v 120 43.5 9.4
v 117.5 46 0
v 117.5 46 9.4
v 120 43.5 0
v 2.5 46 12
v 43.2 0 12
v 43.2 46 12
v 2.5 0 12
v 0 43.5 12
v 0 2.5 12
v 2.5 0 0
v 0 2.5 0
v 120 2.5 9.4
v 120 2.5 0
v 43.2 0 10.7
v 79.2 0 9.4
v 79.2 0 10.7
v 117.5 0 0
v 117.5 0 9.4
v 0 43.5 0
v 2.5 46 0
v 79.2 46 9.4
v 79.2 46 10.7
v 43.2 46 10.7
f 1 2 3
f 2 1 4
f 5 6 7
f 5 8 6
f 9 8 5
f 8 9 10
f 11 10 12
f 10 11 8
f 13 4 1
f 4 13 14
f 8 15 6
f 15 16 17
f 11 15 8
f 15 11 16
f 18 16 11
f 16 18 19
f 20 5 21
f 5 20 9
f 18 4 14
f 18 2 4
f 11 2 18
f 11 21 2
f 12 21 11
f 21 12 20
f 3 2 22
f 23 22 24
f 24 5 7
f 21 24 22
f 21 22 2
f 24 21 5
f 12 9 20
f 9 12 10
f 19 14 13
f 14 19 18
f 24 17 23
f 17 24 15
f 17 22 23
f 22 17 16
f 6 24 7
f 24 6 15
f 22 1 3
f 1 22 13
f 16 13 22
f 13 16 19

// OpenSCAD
$fn = 32;

// ----------------------------------------------------------------------
// Stepped bar: twostep, 120 x 46 x 12/9.4 mm
// ----------------------------------------------------------------------

// --- parameters (mm) ---
bar_l = 120;              // bar length, X
bar_w = 46;               // bar width, Y
plate_t = 12;             // thickness of the thick zone, Z
thin_t = 9.4;             // thickness of the thin zone
corner_c = 2.5;           // corner chamfer of the bar
step_cut = 2.6;           // material removed from the thin zone
stair1_x = 43.2;          // position of the first stair
stair2_x = 79.2;          // position of the second stair
mid_t = 10.7;             // thickness of the middle zone
depth_1 = 1.3;            // depth of cut 1 from the top face
depth_2 = 2.6;            // depth of cut 2 from the top face

profile = [[2.5, 0], [117.5, 0], [120, 2.5], [120, 43.5], [117.5, 46], [2.5, 46], [0, 43.5], [0, 2.5]];  // primary outline, 8 points, counter clockwise
void_1 = [[43.2, -1], [79.2, -1], [79.2, 47], [43.2, 47]];  // first stair, 4 points
void_2 = [[79.2, -1], [121, -1], [121, 47], [79.2, 47]];  // second stair, 4 points

// --- the one profile operation ---
difference() {
  linear_extrude(height = plate_t) polygon(points = profile);
  translate([0, 0, plate_t - depth_1])
    linear_extrude(height = depth_1 + 1) polygon(points = void_1);
  translate([0, 0, plate_t - depth_2])
    linear_extrude(height = depth_2 + 1) polygon(points = void_2);
}
